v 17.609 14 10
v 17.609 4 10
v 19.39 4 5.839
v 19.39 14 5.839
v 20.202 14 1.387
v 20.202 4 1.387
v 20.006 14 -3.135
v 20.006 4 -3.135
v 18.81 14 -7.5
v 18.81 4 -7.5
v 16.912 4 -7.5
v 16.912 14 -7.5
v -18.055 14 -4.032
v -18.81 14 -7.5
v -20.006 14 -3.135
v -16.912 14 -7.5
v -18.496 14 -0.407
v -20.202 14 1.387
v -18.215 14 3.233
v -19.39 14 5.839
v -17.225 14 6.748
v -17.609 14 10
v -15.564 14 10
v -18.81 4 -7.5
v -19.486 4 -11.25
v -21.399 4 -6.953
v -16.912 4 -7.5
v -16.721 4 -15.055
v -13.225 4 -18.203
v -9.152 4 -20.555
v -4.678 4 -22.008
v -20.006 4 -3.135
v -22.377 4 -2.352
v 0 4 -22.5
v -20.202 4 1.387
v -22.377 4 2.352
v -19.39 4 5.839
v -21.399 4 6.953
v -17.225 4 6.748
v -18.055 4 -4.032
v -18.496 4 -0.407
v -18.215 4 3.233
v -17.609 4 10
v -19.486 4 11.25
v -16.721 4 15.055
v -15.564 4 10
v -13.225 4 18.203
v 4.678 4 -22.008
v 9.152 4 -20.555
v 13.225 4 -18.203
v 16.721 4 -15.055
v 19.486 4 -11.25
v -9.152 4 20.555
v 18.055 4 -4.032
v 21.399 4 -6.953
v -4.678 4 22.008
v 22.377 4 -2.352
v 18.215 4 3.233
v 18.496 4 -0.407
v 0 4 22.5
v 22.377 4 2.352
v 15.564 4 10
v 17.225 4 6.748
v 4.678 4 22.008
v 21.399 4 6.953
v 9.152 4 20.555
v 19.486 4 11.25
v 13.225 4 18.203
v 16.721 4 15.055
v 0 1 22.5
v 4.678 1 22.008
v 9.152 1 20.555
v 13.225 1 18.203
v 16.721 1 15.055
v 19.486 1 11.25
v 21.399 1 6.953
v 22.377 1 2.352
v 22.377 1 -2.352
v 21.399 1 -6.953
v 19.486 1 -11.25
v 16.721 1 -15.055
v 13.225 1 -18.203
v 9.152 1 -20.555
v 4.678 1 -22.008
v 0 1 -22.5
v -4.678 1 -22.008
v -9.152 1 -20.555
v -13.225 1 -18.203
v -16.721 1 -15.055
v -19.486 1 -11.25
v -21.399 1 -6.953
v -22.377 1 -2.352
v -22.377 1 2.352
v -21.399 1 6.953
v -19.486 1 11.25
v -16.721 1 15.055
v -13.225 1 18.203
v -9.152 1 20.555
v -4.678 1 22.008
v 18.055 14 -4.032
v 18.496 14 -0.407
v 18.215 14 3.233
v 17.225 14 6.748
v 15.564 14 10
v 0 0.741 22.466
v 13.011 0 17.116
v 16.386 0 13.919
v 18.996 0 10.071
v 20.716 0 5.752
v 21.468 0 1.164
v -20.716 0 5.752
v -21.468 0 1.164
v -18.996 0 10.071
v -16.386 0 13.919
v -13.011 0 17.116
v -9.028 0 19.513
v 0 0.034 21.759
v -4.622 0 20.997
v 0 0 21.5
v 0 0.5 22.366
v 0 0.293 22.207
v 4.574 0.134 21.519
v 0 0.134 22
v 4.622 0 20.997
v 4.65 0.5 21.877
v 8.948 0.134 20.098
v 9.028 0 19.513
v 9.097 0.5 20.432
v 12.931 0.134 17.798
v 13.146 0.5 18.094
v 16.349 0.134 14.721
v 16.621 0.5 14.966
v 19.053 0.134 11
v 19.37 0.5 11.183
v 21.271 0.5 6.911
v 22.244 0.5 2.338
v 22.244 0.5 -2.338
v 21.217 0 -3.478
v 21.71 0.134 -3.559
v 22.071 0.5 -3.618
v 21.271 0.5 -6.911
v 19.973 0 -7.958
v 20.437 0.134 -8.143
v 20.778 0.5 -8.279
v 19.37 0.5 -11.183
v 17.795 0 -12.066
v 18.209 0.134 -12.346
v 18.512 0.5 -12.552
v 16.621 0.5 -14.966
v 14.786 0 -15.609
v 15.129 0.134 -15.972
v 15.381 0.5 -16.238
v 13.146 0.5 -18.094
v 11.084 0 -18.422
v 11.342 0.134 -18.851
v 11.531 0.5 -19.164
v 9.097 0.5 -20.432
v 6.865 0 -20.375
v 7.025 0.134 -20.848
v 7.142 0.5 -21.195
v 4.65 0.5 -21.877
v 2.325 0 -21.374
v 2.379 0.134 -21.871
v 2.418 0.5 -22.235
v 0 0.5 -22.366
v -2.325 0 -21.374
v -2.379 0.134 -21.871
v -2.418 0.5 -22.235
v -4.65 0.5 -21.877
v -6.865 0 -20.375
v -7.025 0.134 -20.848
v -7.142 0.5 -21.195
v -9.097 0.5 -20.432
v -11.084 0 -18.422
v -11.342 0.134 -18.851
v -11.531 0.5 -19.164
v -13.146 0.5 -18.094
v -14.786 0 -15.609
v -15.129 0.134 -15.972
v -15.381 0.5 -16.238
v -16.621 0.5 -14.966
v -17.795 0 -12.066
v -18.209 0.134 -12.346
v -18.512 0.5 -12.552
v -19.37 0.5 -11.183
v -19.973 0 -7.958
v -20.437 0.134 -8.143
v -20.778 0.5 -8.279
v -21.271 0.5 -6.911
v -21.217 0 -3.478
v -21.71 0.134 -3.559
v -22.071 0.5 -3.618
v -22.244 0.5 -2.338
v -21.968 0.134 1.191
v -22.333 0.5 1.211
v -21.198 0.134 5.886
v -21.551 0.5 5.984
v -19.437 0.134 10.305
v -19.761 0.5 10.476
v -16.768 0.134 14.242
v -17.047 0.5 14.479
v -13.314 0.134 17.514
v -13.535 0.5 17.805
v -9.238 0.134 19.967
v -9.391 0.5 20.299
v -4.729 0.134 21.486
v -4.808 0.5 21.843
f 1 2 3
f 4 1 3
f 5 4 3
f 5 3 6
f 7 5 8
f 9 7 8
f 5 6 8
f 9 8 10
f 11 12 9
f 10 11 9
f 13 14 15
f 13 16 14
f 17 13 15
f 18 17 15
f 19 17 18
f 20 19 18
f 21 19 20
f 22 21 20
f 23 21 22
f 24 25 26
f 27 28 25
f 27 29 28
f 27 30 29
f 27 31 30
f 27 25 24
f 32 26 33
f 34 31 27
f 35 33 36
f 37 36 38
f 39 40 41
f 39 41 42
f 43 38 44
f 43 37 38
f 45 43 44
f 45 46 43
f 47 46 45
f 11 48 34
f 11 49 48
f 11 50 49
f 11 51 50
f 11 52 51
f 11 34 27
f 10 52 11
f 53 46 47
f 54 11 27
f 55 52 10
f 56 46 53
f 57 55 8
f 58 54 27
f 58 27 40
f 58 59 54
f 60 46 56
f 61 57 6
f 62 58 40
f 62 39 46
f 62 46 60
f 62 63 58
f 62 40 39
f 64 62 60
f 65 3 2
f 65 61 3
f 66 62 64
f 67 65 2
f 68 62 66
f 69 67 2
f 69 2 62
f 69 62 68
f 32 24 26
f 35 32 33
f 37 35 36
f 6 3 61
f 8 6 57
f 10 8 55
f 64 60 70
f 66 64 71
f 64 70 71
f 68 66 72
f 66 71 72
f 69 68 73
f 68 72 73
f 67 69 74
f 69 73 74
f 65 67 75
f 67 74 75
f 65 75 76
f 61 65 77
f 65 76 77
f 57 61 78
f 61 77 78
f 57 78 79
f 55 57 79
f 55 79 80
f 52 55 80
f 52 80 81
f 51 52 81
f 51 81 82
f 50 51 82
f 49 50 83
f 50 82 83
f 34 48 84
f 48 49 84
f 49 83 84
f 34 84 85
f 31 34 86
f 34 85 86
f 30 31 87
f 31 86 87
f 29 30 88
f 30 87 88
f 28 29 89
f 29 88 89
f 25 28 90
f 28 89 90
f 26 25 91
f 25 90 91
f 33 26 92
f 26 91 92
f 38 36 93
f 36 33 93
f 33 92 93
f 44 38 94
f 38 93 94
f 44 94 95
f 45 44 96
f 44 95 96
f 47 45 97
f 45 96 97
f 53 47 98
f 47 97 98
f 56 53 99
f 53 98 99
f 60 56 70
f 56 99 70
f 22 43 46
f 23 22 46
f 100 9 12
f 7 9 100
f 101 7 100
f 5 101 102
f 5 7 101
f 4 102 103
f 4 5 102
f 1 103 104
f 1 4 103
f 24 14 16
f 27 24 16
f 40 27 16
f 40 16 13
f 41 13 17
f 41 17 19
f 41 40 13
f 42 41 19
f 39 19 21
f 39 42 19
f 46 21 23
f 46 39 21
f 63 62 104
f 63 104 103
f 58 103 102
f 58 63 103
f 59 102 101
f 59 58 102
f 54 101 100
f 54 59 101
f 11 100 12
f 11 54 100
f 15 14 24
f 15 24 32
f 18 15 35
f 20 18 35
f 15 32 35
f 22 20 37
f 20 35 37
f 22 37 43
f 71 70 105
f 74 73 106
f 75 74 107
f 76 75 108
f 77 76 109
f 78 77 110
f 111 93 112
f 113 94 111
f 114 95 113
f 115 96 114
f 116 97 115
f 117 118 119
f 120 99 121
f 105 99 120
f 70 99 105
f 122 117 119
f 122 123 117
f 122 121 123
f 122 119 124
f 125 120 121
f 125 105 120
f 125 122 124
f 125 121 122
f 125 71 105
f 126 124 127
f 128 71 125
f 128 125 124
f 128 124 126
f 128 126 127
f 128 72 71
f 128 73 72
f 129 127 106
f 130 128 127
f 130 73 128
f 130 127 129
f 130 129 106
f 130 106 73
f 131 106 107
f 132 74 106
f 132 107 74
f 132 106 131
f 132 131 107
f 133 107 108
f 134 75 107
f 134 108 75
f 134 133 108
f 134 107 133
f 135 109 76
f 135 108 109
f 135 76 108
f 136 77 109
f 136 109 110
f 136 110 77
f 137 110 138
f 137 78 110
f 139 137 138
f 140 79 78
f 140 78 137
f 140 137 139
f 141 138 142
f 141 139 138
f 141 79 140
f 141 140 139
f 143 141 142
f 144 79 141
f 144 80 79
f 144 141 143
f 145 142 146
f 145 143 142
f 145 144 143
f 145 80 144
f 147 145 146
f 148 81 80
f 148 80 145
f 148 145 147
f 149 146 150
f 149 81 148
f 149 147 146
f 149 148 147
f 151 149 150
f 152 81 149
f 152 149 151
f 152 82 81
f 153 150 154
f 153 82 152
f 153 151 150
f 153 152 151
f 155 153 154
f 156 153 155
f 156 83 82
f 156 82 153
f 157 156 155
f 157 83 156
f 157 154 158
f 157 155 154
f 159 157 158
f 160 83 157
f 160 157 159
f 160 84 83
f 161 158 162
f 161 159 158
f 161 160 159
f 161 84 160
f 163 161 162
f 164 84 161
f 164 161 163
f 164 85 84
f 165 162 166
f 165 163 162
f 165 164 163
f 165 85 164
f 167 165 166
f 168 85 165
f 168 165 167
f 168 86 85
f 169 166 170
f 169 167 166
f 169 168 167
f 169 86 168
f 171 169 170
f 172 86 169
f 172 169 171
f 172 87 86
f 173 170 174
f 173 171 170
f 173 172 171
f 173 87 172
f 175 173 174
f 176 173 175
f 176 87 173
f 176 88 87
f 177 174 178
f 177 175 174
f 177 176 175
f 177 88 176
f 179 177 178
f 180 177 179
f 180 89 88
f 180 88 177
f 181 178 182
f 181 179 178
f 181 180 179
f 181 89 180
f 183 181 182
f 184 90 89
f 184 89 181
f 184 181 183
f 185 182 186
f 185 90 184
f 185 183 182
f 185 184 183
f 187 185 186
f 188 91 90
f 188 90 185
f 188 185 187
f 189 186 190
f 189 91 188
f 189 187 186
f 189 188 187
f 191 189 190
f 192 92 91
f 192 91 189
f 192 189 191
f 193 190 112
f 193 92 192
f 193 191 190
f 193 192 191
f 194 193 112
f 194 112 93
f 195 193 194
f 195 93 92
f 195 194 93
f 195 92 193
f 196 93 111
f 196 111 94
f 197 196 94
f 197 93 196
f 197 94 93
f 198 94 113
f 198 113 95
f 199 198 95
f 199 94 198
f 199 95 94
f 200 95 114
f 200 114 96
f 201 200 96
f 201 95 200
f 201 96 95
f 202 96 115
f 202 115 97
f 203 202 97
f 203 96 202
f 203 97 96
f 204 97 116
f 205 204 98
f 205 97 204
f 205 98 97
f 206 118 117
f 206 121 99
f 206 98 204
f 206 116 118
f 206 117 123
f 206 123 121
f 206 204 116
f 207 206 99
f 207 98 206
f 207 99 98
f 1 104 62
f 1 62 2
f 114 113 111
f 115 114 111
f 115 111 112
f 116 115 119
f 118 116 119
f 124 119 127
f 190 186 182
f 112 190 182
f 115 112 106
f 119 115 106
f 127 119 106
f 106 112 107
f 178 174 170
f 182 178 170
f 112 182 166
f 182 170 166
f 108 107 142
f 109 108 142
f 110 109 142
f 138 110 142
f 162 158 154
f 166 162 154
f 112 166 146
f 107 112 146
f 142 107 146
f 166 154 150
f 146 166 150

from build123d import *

# Parameters (mm, degrees)
SKETCH1_R           = 22.5
SKETCH1_R_2         = 20.25
SKETCH1_R_3         = 18.5
BOSS_EXTRUDE1_DEPTH = 4
SKETCH2_R           = 20.25
SKETCH2_R_2         = 18.5
BOSS_EXTRUDE2_DEPTH = 10
SKETCH3_W           = 46.515228405
SKETCH3_H           = 15.633520553
SKETCH3_W_2         = 41.010467647
SKETCH3_H_2         = 11.670092807
CUT_EXTRUDE1_DEPTH  = 10
FILLET1_R           = 1


with BuildPart() as part:
    # Sketch1 → Boss-Extrude1 (new body)
    # profile 1 of 3: a face of its own
    with BuildSketch(Plane(origin=(0, 0, 0), x_dir=(1, 0, 0), z_dir=(0, 1, 0))):
        with Locations(Location((0, 0, 0), (0, 0, 270))):
            Circle(SKETCH1_R)
        Circle(SKETCH1_R_2, mode=Mode.SUBTRACT)
    # profile 2 of 3: a face of its own
    with BuildSketch(Plane(origin=(0, 0, 0), x_dir=(1, 0, 0), z_dir=(0, 1, 0))):
        Circle(SKETCH1_R_2)
        Circle(SKETCH1_R_3, mode=Mode.SUBTRACT)
    # profile 3 of 3: a face of its own
    with BuildSketch(Plane(origin=(0, 0, 0), x_dir=(1, 0, 0), z_dir=(0, 1, 0))):
        Circle(SKETCH1_R_3)
    extrude(amount=BOSS_EXTRUDE1_DEPTH)

    # Sketch2 → Boss-Extrude2 (add)
    with BuildSketch(Plane(origin=(0, 4, 0), x_dir=(1, 0, 0), z_dir=(0, 1, 0))):
        with Locations(Location((0, 0, 0), (0, 0, 270))):
            Circle(SKETCH2_R)
        with Locations(Location((0, 0, 0), (0, 0, 270))):
            Circle(SKETCH2_R_2, mode=Mode.SUBTRACT)
    extrude(amount=BOSS_EXTRUDE2_DEPTH)

    # Sketch3 → Cut-Extrude1 (cut)
    with BuildSketch(Plane(origin=(0, 14, 0), x_dir=(1, 0, 0), z_dir=(0, 1, 0))):
        with Locations((-0.927501078, 15.316760277)):
            Rectangle(SKETCH3_W, SKETCH3_H)
        with Locations((-0.707310647, -15.835046403)):
            Rectangle(SKETCH3_W_2, SKETCH3_H_2)
    extrude(amount=-CUT_EXTRUDE1_DEPTH, mode=Mode.SUBTRACT)

    # Fillet1
    fillet1_edges = [part.edges().sort_by_distance(p)[0] for p in [
        (0, 0, -22.5),
    ]]
    fillet(fillet1_edges, radius=FILLET1_R)


solid = part.part
